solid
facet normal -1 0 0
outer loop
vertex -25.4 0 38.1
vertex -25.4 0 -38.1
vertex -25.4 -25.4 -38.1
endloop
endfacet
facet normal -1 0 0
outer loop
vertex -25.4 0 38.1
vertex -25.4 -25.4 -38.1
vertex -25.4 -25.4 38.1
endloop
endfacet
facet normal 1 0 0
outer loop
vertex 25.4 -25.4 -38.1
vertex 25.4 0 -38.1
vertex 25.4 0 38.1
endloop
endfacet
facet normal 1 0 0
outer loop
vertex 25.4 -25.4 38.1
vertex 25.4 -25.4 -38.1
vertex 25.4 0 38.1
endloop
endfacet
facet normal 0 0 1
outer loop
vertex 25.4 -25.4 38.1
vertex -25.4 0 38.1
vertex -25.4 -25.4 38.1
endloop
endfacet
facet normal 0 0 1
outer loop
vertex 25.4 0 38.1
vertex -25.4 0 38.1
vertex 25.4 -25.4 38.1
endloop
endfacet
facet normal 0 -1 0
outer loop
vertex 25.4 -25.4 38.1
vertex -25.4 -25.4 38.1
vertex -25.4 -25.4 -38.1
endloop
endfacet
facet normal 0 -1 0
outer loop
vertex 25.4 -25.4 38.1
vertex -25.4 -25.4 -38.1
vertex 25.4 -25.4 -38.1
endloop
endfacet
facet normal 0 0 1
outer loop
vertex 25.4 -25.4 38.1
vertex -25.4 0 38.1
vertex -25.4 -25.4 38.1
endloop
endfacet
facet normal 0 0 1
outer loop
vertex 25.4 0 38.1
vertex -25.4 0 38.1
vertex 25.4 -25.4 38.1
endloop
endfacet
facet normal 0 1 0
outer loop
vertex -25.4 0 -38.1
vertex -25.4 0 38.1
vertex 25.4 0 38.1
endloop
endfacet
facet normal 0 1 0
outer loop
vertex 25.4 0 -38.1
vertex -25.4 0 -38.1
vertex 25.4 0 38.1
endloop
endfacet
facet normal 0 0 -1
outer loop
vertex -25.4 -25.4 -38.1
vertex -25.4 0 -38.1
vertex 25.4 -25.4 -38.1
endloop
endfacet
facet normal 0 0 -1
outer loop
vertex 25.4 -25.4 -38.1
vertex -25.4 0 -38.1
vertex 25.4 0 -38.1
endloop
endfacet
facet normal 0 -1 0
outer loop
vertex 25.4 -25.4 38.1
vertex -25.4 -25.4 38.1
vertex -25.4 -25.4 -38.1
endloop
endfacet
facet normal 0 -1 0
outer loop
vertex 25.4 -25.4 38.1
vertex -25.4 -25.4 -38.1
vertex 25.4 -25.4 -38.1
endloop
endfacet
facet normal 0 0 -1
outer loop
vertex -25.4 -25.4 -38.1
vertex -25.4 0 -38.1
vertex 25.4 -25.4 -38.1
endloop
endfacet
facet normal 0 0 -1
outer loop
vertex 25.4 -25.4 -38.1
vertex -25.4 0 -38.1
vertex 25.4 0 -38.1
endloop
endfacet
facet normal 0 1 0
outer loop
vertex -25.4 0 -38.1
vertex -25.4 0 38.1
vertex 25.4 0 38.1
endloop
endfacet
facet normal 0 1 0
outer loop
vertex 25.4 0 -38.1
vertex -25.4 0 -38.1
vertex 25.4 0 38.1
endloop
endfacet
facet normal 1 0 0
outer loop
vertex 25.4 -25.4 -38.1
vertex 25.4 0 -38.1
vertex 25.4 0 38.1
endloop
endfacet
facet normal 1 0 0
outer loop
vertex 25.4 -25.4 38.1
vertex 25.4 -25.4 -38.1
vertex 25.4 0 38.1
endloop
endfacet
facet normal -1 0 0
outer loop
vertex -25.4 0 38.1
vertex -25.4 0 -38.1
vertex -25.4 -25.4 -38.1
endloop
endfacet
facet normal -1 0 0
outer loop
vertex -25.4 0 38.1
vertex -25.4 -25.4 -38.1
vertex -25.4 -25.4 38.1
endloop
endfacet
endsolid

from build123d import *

# Parameters (mm, degrees)
F0_W     = 50.8
F0_H     = 76.2
F1_DEPTH = 25.4
F2_DEPTH = 25.4


with BuildPart() as f1:
    # F0 (on Front) → F1 (new body)
    with BuildSketch(Plane.XZ):
        Rectangle(F0_W, F0_H)
    extrude(amount=F1_DEPTH)


with BuildPart() as f2:
    # F0 (on Front) → F2 (new body)
    with BuildSketch(Plane.XZ):
        Rectangle(F0_W, F0_H)
    extrude(amount=F2_DEPTH)


solid = Compound([f1.part, f2.part])
